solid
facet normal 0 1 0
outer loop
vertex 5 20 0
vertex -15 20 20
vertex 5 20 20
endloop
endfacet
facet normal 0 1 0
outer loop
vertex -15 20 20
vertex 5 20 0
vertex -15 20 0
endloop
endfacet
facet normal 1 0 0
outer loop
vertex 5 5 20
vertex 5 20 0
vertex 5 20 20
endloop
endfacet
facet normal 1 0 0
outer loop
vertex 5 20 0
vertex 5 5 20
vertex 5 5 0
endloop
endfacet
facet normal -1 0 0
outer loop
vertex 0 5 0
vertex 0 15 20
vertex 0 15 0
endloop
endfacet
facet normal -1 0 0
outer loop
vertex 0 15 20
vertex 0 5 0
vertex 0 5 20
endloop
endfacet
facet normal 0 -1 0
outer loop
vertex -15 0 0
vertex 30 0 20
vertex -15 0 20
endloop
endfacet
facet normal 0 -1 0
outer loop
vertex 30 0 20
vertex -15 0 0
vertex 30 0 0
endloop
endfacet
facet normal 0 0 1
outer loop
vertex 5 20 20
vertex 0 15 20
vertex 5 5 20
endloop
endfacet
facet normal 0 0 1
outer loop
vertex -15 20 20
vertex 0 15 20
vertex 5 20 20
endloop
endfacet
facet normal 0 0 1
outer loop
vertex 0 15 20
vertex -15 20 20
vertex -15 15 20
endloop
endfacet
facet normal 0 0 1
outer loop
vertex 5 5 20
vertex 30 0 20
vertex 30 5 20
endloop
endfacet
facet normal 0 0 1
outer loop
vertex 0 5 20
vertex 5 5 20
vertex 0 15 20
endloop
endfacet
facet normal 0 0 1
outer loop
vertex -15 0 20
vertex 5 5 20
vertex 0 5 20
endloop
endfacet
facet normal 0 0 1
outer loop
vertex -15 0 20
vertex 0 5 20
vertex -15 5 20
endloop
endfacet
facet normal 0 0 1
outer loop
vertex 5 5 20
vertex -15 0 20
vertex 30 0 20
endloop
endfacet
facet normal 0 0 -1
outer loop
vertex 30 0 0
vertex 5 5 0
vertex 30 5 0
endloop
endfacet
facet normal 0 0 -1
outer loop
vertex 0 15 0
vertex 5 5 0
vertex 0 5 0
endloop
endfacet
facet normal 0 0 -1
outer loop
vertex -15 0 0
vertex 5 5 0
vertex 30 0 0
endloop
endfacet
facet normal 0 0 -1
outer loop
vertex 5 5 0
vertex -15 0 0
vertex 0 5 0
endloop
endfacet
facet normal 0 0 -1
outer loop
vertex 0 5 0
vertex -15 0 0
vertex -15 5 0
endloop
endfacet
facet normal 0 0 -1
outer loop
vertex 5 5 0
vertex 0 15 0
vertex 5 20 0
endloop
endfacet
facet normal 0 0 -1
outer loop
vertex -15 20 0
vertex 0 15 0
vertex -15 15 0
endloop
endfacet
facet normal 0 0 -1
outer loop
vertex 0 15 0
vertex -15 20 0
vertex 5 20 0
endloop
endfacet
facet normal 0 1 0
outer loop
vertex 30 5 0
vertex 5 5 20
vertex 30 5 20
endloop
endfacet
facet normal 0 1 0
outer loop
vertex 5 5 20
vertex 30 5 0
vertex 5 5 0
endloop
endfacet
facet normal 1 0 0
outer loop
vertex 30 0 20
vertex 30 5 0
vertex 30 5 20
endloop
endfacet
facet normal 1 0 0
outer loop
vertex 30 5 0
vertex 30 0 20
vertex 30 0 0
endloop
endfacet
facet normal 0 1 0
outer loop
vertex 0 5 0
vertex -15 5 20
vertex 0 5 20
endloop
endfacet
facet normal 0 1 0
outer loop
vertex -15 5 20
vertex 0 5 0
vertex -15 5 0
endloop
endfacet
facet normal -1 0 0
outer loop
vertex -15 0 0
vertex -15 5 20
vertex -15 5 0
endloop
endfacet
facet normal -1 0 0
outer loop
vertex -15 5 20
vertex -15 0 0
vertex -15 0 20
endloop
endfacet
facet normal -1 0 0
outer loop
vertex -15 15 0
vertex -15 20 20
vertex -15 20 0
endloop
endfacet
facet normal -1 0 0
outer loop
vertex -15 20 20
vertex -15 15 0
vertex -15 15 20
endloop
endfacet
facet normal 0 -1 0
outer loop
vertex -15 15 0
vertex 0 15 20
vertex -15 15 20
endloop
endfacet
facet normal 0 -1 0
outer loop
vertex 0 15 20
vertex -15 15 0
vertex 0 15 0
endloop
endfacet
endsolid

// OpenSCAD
module chair() {
	rotate(a=[90,0,90], v=[0,0,0])union () {
		cube([20,20,5]);
		cube([5,20,30]);
		translate([0,0,-15])cube([5,20,15]);
		translate([15,0,-15])cube([5,20,15]);
	}
}

module table() {
	cube([60,5,30]);
	translate([20,0,0])cube([5,30,30]);
	translate([35,0,0])cube([5,30,30]);
}

chair();
//table();
